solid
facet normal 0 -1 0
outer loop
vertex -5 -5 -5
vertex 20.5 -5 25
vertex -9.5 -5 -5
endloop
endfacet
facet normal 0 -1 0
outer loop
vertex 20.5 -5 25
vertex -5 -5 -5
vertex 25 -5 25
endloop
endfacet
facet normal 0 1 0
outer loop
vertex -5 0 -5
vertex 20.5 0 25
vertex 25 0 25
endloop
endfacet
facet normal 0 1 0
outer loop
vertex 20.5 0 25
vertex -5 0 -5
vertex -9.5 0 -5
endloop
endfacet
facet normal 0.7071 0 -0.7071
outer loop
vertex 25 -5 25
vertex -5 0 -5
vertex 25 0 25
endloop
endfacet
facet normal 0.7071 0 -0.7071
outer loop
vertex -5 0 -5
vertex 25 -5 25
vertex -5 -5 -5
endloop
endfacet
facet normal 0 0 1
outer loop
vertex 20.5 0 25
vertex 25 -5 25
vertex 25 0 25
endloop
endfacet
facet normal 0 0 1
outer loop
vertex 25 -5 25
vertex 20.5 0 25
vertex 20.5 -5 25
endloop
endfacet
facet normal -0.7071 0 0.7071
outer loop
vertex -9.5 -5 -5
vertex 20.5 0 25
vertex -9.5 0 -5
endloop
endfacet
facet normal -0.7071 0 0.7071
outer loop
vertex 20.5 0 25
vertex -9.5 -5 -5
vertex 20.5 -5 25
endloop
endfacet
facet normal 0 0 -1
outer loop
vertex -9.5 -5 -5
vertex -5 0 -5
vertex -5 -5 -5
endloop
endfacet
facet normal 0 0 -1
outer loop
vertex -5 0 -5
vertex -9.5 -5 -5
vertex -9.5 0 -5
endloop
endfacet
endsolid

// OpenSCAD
let($fa=2.000000, $fn=0, $fs=0.150000) multmatrix(m=[[1.000000, -0.300000, 0.000000, -5.000000], [0.000000, 0.000000, -1.000000, -0.000000], [1.000000, 0.000000, 0.000000, -5.000000], [0.000000, 0.000000, 0.000000, 1.000000]]) cube(size=[30.000000, 15.000000, 5.000000]);
